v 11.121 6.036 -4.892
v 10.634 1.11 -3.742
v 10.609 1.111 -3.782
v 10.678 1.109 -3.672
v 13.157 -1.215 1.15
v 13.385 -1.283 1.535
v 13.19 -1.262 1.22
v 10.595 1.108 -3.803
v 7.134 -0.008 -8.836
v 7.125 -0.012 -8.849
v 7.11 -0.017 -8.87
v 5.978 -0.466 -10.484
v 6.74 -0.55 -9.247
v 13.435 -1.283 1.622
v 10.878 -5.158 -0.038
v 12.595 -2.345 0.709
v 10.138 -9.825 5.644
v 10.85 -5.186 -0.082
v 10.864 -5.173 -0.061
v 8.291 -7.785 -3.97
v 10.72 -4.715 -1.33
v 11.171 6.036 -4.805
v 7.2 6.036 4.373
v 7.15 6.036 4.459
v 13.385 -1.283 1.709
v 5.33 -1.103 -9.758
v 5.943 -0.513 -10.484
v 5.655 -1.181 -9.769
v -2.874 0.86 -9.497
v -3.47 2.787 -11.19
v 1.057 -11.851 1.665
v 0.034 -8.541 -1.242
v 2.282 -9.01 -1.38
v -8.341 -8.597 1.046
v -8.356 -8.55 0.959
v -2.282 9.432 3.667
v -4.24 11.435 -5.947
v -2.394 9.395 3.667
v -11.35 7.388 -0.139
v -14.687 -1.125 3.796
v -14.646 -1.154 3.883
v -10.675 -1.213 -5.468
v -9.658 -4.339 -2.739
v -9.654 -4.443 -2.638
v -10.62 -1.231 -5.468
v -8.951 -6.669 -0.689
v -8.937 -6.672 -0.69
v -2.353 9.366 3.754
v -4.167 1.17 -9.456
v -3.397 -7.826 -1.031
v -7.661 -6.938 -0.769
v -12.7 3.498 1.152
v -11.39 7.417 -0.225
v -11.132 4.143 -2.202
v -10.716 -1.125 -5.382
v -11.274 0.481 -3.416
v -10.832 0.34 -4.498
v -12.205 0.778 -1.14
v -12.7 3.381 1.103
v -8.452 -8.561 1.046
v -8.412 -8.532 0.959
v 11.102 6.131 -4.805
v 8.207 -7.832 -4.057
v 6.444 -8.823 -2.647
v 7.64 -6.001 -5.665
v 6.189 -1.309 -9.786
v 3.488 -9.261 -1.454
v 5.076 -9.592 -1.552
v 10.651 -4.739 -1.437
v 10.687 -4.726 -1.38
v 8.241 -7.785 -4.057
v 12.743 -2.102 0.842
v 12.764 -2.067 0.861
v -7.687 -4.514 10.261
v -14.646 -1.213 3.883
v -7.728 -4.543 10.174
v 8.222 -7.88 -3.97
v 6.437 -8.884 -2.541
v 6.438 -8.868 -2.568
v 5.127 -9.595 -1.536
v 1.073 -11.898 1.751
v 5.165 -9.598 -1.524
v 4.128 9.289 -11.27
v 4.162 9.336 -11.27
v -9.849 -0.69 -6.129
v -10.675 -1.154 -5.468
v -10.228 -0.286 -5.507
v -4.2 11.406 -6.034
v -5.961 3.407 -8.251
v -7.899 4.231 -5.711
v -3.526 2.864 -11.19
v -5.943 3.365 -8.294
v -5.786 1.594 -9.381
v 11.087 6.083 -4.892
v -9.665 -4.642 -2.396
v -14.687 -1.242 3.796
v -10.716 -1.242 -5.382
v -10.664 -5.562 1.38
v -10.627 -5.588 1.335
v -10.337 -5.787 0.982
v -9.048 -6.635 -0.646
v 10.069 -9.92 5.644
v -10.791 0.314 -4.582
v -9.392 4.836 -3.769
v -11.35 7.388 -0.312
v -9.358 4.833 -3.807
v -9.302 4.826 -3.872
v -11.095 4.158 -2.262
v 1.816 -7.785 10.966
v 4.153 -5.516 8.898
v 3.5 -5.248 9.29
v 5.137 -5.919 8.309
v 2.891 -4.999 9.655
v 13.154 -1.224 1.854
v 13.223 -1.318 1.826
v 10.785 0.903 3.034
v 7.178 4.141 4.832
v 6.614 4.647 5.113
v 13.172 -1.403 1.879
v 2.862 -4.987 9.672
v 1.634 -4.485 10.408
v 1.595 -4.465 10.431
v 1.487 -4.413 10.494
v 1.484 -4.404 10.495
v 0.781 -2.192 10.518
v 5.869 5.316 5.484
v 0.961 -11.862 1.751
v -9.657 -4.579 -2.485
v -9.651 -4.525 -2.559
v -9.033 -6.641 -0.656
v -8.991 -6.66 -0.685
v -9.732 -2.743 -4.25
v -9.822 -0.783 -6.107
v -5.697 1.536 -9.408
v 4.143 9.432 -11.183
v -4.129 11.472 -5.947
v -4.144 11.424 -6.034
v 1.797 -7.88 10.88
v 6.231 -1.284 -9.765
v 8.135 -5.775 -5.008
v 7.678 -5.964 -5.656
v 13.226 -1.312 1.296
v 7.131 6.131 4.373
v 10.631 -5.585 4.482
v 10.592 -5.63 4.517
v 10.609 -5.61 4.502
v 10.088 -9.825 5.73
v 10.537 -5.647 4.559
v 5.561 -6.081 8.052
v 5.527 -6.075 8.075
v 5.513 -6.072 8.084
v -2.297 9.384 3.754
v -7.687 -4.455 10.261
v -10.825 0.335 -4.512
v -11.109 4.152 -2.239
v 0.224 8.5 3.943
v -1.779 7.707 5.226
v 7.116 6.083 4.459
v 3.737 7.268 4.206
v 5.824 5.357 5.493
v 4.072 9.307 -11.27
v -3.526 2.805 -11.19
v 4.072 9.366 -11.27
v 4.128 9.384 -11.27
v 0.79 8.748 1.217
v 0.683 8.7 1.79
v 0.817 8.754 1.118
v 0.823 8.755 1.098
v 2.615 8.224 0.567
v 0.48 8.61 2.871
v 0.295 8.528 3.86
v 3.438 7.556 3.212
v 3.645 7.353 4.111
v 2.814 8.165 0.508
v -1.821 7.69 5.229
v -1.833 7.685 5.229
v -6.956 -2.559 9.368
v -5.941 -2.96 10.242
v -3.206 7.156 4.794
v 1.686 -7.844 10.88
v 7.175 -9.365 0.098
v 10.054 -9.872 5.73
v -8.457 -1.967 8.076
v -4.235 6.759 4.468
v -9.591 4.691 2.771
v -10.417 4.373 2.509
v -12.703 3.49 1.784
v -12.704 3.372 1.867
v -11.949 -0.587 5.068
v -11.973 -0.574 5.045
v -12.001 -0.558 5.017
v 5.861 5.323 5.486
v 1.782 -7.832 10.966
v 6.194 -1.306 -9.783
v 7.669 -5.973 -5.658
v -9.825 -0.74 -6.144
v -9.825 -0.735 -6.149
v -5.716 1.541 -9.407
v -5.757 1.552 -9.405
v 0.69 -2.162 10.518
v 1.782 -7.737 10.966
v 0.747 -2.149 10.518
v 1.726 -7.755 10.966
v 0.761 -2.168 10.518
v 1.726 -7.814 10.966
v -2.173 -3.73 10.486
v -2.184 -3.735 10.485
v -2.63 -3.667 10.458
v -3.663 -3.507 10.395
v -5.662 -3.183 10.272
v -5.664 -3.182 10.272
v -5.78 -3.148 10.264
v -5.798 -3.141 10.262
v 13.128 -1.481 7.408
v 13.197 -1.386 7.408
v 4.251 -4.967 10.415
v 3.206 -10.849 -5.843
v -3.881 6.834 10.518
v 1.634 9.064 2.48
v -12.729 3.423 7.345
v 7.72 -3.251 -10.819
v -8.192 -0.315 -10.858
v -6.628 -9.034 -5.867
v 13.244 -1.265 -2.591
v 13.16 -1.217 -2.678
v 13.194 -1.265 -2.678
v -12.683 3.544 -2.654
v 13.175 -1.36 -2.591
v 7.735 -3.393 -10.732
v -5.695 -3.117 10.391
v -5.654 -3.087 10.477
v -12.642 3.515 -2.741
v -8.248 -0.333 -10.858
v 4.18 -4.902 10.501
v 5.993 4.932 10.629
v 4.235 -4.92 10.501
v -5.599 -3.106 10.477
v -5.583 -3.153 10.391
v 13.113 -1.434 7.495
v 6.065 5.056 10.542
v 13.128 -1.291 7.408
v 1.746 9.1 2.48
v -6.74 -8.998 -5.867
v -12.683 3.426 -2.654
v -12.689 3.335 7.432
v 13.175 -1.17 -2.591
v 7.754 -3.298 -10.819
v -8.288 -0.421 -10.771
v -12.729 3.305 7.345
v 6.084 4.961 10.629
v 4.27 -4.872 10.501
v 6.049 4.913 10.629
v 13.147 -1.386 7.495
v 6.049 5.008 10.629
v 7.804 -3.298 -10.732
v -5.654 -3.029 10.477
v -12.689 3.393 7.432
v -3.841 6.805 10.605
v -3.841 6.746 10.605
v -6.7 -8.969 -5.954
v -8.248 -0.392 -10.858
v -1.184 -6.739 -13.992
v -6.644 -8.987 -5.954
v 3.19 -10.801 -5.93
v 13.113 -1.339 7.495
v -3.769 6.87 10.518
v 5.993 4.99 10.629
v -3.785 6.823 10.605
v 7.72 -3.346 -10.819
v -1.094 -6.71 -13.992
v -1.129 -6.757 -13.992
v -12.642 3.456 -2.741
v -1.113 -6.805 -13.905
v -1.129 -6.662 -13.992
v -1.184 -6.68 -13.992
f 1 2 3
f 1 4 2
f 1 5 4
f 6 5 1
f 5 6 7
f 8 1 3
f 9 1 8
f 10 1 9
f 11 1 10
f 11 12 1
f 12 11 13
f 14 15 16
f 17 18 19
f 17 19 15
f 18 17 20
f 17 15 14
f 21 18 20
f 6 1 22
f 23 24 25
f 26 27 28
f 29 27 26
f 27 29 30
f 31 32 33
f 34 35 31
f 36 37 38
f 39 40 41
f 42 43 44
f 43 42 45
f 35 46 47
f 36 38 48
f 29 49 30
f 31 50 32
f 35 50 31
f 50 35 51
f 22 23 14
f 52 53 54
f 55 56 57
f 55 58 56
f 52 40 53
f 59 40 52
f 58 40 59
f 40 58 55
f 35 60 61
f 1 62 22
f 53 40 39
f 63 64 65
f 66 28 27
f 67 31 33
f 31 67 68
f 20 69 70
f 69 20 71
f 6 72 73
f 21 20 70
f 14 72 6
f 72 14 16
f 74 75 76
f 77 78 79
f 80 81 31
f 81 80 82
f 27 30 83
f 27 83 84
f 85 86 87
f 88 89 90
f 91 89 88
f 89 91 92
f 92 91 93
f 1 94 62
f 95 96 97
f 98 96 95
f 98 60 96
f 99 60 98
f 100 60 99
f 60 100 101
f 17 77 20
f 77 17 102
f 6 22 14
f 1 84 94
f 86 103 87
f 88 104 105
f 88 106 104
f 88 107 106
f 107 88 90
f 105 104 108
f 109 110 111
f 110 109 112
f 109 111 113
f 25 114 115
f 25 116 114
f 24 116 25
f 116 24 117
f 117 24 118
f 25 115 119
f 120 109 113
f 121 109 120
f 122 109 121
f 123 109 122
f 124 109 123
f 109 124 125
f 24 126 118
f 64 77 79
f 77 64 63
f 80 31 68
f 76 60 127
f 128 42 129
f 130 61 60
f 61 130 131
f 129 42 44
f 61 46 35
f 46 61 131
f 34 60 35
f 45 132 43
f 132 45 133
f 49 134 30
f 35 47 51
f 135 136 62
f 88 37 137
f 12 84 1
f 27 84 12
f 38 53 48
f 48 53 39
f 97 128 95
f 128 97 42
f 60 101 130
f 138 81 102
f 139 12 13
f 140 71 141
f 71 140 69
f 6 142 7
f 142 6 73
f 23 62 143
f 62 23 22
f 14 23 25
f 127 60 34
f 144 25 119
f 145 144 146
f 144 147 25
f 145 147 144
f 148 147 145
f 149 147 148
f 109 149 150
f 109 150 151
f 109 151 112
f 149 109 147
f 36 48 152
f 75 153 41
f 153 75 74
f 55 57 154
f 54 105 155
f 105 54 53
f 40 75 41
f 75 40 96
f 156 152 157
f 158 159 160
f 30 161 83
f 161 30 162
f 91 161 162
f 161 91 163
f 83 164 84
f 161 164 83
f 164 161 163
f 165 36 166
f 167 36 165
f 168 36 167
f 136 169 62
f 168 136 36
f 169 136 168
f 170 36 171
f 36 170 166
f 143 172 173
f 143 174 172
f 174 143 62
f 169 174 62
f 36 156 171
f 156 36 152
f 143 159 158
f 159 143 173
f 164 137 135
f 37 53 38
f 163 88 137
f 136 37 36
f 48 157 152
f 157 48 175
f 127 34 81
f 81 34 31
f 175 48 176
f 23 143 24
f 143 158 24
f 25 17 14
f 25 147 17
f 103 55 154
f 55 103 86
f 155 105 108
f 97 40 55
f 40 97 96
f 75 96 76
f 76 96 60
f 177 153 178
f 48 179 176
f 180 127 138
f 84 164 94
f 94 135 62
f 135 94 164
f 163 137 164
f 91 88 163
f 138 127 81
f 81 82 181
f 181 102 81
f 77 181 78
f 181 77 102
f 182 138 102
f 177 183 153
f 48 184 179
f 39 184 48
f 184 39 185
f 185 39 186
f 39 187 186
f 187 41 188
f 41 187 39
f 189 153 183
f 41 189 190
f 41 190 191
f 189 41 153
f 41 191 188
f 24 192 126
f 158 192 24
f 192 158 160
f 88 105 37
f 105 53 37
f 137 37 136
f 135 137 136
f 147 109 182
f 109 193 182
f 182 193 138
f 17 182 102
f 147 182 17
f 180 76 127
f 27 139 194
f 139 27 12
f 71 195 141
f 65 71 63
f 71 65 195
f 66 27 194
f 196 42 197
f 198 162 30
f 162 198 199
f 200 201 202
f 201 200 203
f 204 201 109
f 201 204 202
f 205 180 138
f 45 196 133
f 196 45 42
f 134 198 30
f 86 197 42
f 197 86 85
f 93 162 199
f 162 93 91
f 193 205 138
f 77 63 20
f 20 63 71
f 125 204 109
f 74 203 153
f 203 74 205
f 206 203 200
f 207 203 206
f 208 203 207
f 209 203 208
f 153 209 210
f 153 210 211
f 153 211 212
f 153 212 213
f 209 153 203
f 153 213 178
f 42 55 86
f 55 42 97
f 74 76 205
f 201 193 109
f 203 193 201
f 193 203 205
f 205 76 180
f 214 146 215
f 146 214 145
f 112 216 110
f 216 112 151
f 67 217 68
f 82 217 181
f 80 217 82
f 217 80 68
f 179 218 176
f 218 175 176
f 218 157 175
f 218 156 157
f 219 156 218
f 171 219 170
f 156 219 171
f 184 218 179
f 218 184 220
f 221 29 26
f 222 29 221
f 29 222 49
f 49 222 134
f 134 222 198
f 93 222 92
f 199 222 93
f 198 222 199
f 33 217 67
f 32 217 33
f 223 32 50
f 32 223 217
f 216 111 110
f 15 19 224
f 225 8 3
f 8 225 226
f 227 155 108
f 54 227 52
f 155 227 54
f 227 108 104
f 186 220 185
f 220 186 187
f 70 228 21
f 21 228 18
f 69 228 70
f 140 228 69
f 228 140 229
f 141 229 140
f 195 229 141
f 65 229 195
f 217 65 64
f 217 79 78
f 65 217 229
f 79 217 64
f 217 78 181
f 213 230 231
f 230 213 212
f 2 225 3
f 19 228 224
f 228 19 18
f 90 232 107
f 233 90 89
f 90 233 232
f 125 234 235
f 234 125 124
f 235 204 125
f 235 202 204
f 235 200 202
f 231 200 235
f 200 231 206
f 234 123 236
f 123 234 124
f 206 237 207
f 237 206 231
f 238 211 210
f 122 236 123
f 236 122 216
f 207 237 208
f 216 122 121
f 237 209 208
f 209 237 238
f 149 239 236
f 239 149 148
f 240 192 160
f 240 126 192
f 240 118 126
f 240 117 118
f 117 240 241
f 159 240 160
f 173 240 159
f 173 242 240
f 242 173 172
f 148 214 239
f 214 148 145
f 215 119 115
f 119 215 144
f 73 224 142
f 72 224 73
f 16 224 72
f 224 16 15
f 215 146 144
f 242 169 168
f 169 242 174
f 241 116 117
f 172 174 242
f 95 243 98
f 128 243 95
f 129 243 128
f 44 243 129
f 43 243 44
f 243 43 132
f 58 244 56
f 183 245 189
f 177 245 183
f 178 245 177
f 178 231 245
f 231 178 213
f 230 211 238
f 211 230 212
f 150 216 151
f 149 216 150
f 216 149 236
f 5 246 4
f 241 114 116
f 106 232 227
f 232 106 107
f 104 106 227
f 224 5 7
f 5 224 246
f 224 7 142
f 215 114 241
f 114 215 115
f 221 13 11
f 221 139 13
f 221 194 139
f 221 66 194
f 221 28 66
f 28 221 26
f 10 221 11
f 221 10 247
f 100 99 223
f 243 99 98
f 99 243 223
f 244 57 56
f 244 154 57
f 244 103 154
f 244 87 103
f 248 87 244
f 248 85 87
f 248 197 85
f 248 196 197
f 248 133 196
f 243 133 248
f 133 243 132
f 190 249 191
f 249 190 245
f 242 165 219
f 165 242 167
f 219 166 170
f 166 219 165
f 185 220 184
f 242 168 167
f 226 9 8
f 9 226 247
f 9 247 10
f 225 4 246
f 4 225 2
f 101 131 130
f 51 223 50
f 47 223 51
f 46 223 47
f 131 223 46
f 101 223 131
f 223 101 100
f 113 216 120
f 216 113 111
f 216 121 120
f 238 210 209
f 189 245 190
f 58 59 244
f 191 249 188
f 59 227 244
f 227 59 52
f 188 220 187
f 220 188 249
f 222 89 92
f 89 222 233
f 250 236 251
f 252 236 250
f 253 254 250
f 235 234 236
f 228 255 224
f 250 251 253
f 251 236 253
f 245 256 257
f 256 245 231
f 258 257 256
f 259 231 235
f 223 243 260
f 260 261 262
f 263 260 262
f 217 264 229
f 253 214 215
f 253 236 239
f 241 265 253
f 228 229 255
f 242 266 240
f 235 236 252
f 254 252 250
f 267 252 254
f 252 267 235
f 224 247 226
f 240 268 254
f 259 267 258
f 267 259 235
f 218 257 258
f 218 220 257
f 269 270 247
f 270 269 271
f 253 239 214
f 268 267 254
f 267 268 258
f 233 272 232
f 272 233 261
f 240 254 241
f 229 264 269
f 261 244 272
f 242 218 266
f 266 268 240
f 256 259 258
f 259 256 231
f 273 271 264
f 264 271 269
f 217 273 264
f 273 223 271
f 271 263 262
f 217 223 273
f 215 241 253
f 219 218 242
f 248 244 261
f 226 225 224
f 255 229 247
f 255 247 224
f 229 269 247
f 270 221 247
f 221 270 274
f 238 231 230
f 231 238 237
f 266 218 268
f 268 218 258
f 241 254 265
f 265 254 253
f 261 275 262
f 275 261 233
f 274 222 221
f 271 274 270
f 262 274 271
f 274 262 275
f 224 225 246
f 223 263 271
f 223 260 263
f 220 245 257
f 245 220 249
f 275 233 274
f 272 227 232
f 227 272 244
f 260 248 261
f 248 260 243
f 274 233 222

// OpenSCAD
// Auto-generated OpenSCAD file

    inner_points = 10*[[-0.8207364448332389, -0.03625987639799513, -1.077103005931804], [-0.3800079511582095, 0.6775294643132357, 1.0518242237897182], [1.314406218043804, -0.12649016604771388, -0.2591223940027388], [-1.2601675662397096, 0.3485174868667573, -0.26540930122634293], [0.6033917278936528, 0.4960926858162208, 1.0542256086650177], [0.7704376603984122, -0.3298307508154513, -1.0732174835834996], [-0.6659377447570157, -0.8939163933116565, -0.5867330828632719], [-0.5614003085180945, -0.3057984452791665, 1.03905571142295], [0.8614304919402382, -0.8720125870409337, 0.22976339159278825], [-1.105368866163486, -0.5091390300469038, 0.2249606218421892], [0.42199937053376757, -0.4872352237761812, 1.0414570962982492], [0.31746193429484665, -1.0753531718086713, -0.5843316979879724], [-0.3724387452492543, 0.6971415864952342, -0.5660731958680674], [0.17152981239613735, 0.9004821712629716, 0.24802189371269331], [0.6109609338026081, 0.5157048079982192, -0.5636718109927679], [-0.1143999812026689, -0.6709636863619204, -1.390535412940297], [-1.2648455927592903, 0.33639652876676684, 0.7345062944329209], [1.3097281915242232, -0.13861112414770457, 0.7407932016565248]];

    outer_points = 10*[[-0.7646716571891983, -0.4484124824111452, 1.017411015424149], [1.3334724658866113, -0.12832498152302135, 0.16218986970952987], [-0.4159593615000292, 1.137644887460793, -0.5946962179229037], [0.17664237883325157, -0.7784874133111438, 1.0879689744258578], [1.1071187428716376, 0.6035724304303223, -0.48053104208131747], [-1.1309196745075054, 0.7358224064074482, -0.022533265133765135], [-0.837148057149246, -0.8502349634644899, 0.10456608600351325], [0.8191262918806799, -0.7784874133111438, -0.39703890778391676], [-0.3485414671567439, 0.2834849295421984, -1.1103177785764728], [0.10416597887320383, -1.1803098943644885, 0.17512404500522194], [0.5927725688657061, -0.046590001357800344, -1.0397598195747642], [-1.06350178016422, -0.1183375515111464, -0.5381548257873341], [-0.00491846562418119, 0.20174994937697738, 1.009417255474962], [0.7100418473832949, 0.6035724304303223, 0.43725430268582344], [-0.23127218863915502, 0.9336473613303209, 0.3666963436841147], [-1.4605786756525627, -0.1183375515111464, 0.3796305189798069], [1.0038134647415542, -0.9824849394416157, 0.5643536538231018], [0.41121172440827325, 0.9336473613303209, -1.1183115385256597]];

    // Convex hull for inner set (I)
    module inner_hull() {
        hull() {
            for (p = inner_points) {
                translate(p) sphere(r=0.1);
            }
        }
    }

    // Convex hull for outer set (O) minus inner hull (O \ I)
    module outer_minus_inner() {
        difference() {
            hull() {
                for (p = outer_points) {
                    translate(p) sphere(r=0.1);
                }
            }
            inner_hull(); // Subtract inner hull
        }
    }

    // Convex hull for outer set (O) minus all translated inner hulls
    module outer_minus_AllTranslationInner() {
        difference() {
            hull() {
                for (p = outer_points) {
                    translate(p) sphere(r=0.1);
                }
            }
            hull() {
                translate([0,0,50]) inner_hull();
                translate([0,0,-50]) inner_hull();
            }; // Subtract translated inner hulls
        }
    }

    // Difference between outer_minus_inner and outer_minus_AllTranslationInner
    module outer_minus_inner_diff() {
        difference() {
            // Outer minus inner
            difference() {
                hull() {
                    for (p = outer_points) {
                        translate(p) sphere(r=0.1);
                    }
                }
                inner_hull();
            }

            // Subtract Outer minus AllTranslationInner
            difference() {
                hull() {
                    for (p = outer_points) {
                        translate(p) sphere(r=0.1);
                    }
                }
                hull() {
                    translate([0,0,50]) inner_hull();
                    translate([0,0,-50]) inner_hull();
                };
            }
        }
    }

    // Rendering all with colors applied
    color([1, 0, 0, 0.5]) inner_hull(); // Transparent red
    color([0, 1, 0, 1]) outer_minus_AllTranslationInner(); // Opaque green
    color([1, 1, 0, 1]) outer_minus_inner_diff(); // Opaque yellow
    
